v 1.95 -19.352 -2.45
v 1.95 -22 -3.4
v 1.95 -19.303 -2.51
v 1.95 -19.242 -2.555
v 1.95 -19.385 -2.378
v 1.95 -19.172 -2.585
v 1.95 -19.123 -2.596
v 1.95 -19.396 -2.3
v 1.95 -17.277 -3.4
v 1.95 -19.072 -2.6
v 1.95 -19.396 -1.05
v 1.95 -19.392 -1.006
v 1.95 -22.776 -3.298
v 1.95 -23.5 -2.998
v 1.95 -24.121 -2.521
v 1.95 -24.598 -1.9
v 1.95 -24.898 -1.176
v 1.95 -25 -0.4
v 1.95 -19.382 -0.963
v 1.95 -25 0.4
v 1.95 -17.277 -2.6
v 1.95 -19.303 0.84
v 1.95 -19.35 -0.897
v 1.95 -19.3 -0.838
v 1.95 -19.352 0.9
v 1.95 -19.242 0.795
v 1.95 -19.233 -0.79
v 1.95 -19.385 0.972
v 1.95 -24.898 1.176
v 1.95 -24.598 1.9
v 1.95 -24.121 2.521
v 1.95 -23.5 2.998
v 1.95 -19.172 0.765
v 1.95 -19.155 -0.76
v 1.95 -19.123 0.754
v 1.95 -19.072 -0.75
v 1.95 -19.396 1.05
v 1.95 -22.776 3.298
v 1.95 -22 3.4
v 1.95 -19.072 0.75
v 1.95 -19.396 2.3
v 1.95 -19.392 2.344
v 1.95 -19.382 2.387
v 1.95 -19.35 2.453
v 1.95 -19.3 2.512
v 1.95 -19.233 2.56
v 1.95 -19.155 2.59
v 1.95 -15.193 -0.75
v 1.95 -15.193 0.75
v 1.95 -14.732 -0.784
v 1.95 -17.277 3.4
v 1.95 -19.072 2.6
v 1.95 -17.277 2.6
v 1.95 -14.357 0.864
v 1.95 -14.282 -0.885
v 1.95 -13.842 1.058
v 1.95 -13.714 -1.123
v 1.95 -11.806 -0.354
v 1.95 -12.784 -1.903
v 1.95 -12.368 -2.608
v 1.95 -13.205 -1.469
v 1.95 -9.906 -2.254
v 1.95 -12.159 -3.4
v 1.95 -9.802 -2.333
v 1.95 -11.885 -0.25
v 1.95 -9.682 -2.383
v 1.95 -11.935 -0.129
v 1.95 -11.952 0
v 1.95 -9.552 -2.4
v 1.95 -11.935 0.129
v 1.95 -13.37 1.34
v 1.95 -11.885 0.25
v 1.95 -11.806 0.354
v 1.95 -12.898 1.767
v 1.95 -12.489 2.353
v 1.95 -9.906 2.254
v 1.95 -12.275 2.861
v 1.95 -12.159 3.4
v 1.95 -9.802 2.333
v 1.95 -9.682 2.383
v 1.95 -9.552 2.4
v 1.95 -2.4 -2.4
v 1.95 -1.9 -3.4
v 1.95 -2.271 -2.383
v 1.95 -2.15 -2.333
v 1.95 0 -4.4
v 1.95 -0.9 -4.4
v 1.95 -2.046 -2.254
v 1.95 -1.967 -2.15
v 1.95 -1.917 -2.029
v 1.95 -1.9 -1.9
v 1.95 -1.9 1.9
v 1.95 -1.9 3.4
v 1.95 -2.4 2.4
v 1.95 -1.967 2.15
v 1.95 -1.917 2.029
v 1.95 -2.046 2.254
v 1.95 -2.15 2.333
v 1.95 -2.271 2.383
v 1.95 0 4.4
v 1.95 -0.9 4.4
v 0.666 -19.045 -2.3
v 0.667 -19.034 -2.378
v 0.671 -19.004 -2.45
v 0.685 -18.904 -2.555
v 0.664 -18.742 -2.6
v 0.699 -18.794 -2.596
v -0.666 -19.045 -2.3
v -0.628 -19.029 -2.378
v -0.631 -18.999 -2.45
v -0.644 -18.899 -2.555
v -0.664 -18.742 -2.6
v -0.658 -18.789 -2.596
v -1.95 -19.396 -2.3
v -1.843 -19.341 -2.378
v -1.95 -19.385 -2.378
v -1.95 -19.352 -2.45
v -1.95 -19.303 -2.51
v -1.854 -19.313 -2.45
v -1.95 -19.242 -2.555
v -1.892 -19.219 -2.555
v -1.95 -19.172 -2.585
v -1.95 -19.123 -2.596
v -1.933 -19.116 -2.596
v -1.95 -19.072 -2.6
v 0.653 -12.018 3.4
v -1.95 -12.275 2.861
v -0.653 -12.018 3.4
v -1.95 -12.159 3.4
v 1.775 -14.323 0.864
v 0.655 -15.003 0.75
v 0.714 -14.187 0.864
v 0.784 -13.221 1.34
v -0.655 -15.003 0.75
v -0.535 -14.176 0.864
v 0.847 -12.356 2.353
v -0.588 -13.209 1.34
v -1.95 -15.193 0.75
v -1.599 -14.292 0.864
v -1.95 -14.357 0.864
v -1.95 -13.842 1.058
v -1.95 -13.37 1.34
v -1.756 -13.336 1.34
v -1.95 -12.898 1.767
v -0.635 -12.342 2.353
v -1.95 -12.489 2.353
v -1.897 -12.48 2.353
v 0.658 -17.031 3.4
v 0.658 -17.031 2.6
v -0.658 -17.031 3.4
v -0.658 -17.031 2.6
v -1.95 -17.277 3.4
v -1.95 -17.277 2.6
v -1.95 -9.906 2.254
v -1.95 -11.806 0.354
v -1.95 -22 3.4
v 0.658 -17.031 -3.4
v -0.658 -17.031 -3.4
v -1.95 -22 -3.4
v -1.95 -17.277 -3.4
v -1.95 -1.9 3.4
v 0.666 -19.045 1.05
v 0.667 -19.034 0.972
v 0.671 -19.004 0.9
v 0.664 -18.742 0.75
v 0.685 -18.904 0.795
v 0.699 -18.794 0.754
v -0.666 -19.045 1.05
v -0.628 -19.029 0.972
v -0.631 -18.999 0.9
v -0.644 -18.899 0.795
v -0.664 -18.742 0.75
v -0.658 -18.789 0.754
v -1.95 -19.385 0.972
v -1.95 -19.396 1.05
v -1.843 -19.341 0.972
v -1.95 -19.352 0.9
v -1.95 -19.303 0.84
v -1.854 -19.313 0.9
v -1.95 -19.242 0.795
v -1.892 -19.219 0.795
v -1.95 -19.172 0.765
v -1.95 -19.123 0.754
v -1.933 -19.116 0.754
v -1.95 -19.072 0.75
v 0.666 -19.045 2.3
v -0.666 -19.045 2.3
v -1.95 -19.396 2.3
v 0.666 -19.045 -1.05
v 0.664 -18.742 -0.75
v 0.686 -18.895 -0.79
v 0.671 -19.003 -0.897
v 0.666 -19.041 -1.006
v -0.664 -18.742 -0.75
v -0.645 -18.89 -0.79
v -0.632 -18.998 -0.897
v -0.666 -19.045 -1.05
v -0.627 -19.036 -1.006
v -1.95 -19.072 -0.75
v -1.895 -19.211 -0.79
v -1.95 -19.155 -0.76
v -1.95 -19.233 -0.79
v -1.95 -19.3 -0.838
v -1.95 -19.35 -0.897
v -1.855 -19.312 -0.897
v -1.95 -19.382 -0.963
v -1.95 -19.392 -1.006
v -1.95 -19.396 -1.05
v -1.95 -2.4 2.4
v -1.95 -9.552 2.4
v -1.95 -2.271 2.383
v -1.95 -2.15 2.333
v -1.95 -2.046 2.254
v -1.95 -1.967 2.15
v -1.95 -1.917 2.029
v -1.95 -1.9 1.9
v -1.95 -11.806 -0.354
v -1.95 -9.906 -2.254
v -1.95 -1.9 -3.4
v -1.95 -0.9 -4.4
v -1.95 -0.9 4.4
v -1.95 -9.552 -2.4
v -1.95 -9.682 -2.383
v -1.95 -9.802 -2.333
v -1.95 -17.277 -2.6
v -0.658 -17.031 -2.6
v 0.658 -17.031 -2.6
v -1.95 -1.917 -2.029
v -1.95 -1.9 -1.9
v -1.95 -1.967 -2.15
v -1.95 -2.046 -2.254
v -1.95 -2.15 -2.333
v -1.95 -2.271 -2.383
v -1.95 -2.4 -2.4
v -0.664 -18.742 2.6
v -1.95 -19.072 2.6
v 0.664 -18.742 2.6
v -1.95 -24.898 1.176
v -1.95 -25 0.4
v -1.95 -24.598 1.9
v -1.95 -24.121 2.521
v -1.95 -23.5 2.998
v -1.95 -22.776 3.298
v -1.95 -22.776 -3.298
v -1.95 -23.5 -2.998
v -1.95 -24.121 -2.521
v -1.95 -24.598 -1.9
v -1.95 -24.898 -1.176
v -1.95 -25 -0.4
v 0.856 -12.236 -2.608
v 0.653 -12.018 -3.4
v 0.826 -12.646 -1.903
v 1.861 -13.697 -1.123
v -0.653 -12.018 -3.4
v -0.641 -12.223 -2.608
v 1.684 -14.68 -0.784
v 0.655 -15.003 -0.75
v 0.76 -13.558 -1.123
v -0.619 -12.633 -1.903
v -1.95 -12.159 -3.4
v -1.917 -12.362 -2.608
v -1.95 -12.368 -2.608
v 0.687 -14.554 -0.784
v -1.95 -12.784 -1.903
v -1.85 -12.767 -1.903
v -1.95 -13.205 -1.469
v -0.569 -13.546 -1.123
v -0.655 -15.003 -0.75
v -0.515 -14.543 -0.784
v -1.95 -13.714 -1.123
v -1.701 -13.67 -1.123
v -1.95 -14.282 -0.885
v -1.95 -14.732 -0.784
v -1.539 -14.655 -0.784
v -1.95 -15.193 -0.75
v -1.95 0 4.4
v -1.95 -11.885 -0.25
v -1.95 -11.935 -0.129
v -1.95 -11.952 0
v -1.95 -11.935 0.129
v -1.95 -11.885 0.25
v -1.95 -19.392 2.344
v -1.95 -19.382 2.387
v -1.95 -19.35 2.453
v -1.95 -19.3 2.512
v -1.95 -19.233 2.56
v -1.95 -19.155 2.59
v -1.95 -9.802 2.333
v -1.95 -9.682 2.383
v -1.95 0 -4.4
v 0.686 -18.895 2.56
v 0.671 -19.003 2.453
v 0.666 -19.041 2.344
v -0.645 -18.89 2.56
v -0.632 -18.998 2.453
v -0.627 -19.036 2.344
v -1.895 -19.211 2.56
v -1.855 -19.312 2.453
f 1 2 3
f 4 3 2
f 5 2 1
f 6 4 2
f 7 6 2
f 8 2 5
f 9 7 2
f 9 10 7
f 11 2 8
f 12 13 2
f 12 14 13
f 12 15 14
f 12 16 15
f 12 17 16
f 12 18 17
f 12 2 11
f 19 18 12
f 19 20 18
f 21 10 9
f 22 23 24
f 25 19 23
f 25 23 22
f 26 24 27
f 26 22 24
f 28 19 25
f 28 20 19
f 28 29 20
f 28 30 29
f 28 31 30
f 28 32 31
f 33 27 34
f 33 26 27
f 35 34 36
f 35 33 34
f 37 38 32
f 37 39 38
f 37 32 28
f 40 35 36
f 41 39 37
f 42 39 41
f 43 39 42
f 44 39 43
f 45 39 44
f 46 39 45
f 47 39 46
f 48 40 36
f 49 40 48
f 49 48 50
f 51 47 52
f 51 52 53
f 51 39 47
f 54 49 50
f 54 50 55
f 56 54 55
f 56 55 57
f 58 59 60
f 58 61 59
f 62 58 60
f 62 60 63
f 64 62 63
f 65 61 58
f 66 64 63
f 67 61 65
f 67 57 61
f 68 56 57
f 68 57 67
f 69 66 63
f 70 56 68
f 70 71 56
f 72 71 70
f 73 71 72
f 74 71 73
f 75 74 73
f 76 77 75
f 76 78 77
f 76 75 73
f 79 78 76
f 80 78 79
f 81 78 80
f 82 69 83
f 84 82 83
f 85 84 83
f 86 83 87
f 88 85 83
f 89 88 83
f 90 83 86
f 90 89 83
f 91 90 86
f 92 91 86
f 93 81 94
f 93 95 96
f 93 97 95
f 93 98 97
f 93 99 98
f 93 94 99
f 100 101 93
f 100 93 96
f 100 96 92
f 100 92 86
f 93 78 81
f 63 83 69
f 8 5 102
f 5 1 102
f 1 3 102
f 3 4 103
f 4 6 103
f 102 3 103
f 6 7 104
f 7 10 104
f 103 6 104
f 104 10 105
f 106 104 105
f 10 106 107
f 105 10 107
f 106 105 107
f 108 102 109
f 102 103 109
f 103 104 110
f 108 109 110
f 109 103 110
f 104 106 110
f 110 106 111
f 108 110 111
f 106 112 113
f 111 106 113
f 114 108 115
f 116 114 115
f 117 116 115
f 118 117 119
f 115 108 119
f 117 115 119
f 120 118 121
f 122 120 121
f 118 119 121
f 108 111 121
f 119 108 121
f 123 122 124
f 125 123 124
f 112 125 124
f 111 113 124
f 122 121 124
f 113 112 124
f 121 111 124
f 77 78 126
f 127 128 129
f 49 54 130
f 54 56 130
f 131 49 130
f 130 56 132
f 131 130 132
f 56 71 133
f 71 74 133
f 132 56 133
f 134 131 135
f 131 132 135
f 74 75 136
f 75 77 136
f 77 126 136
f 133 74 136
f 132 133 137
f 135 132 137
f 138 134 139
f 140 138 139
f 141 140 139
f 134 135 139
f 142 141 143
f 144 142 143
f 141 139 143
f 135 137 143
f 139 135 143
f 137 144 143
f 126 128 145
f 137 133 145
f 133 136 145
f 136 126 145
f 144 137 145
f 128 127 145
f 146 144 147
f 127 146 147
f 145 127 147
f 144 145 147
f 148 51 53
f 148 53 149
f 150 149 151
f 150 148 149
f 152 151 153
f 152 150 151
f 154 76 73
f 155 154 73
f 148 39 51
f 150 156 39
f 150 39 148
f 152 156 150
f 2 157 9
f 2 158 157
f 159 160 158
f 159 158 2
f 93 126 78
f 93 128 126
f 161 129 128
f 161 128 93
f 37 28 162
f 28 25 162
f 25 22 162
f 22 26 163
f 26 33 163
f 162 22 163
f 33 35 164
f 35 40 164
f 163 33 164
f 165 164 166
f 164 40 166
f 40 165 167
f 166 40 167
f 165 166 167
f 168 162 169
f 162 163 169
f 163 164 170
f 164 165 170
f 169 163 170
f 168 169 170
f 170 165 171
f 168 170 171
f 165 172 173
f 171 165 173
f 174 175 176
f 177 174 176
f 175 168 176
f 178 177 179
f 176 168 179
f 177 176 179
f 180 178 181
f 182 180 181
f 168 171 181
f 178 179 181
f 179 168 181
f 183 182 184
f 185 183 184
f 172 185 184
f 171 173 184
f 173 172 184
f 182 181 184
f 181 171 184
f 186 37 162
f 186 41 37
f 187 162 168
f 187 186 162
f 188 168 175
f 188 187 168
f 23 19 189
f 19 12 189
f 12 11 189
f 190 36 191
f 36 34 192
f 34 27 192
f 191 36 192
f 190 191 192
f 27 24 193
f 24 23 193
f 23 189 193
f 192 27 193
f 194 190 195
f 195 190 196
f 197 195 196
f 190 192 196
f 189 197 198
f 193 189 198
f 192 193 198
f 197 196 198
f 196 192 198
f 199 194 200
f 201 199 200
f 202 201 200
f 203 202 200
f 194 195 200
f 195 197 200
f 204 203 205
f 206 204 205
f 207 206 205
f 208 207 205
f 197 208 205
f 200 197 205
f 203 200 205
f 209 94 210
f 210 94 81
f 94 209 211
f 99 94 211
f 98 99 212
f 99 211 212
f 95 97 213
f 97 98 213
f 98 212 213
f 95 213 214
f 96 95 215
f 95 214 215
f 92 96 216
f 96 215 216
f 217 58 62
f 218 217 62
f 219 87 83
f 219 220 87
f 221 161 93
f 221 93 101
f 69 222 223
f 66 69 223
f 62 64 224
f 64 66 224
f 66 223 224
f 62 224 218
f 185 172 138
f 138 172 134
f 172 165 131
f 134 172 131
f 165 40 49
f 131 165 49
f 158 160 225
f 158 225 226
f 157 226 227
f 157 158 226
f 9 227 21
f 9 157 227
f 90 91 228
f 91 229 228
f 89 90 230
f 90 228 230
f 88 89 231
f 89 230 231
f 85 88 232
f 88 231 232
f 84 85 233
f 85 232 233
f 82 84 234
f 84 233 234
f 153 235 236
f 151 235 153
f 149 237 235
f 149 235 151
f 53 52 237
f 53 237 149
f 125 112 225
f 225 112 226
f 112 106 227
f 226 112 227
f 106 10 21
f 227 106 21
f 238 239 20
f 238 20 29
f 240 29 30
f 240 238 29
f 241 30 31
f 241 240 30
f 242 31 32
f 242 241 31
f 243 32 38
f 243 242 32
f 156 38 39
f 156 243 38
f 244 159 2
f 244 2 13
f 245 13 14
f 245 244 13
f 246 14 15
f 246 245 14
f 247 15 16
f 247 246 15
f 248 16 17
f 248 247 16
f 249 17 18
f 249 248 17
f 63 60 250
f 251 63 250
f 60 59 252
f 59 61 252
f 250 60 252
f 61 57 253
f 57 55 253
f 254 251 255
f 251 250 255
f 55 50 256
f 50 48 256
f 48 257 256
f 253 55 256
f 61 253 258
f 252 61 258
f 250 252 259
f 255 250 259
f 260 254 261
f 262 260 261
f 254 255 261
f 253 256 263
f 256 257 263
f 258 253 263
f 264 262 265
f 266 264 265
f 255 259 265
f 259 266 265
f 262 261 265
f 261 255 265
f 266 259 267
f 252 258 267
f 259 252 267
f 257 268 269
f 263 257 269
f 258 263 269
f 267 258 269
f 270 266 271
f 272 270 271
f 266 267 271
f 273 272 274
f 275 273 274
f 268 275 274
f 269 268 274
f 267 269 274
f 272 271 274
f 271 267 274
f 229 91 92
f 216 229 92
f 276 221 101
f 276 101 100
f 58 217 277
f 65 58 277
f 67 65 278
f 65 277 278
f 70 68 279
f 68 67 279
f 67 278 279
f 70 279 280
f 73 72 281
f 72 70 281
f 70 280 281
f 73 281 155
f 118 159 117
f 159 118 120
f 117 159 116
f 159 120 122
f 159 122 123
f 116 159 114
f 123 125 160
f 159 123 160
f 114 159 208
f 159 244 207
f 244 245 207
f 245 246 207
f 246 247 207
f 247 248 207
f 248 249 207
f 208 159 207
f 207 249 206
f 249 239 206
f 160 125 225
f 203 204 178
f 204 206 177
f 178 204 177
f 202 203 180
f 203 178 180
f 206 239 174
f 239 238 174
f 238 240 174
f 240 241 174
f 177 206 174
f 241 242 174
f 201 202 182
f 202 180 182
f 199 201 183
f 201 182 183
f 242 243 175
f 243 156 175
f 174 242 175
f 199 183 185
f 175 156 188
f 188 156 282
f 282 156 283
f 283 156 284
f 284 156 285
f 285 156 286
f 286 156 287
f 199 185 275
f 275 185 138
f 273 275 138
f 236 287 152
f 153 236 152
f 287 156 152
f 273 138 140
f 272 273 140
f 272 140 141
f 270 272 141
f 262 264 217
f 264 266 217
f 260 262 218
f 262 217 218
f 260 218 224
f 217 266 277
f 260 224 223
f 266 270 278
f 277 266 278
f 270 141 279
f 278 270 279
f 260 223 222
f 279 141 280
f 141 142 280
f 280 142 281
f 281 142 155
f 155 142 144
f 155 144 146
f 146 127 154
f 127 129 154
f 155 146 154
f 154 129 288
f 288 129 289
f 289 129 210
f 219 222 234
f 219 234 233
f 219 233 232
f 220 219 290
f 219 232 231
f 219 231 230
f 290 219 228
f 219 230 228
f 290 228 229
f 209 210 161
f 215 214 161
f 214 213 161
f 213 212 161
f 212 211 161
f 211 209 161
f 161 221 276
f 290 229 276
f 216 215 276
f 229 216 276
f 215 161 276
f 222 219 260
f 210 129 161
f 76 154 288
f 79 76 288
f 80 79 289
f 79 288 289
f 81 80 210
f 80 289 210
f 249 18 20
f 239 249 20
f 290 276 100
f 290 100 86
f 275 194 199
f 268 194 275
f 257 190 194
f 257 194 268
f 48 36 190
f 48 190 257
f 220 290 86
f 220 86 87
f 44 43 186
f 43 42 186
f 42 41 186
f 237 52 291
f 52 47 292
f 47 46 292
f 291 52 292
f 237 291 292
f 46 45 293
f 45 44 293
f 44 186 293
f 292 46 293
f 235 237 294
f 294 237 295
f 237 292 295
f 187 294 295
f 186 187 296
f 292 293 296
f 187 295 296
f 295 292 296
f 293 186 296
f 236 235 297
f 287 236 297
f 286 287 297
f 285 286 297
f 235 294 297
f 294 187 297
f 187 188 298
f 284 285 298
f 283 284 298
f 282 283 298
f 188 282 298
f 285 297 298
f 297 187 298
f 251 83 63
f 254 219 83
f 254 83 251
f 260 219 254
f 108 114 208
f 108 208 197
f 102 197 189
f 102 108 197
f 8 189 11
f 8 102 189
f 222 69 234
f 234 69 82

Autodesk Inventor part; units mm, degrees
ref_plane "YZ Plane" through (0, 0, 0) normal (1, 0, 0) x (0, 1, 0)
ref_plane "XZ Plane" through (0, 0, 0) normal (0, 1, 0) x (-1, 0, 0)
ref_plane "XY Plane" through (0, 0, 0) normal (0, 0, 1) x (1, 0, 0)
sketch "Sketch1" plane through (0, 0, 0) normal (1, 0, 0) x (0, 1, 0)
  line L0 (0, 4.4) -> (0, -4.4)
  line L1 (0, -4.4) -> (-0.9, -4.4)
  line L2 (-0.9, -4.4) -> (-1.9, -3.4)
  line L3 (-1.9, -3.4) -> (-1.9, -3.4)
  line L4 (-1.9, -3.4) -> (-25, -3.4)
  line L5 (-25, -3.4) -> (-25, 3.4)
  line L6 (-25, 3.4) -> (-1.9, 3.4)
  line L7 (-1.9, 3.4) -> (-1.9, 3.4)
  line L8 (-1.9, 3.4) -> (-0.9, 4.4)
  line L9 (-0.9, 4.4) -> (0, 4.4)
  line L10 (0, 0) -> (-25, 0) construction
  line L11 (-24, 3.4) -> (-24, -3.4)
  line L12 (-12, 3.4) -> (-12, 0.75)
  line L13 (-12, 0.75) -> (-19, 0.75)
  line L14 (-19, 0.75) -> (-19, 2.6)
  line L15 (-19, 2.6) -> (-17, 2.6)
  line L16 (-17, 2.6) -> (-17, 3.4)
  line L17 (-12, -3.4) -> (-12, -0.75)
  line L18 (-12, -0.75) -> (-19, -0.75)
  line L19 (-19, -0.75) -> (-19, -2.6)
  line L20 (-19, -2.6) -> (-17, -2.6)
  line L21 (-17, -2.6) -> (-17, -3.4)
  dimension "d0" = 8.8
  dimension "d1" = 1.9
  dimension "d2" = 135
  dimension "d5" = 0.9
  dimension "d6" = 25
  dimension "d7" = 6.8
  dimension "d9" = 14
  dimension "d10" = 1
  dimension "d11" = 0.8
  dimension "d13" = 5
  dimension "d16" = 10
  dimension "d24" = 1.5
extrude "Extrusion1" add sketch "Sketch1" along normal mid plane 3.9
revolve "Revolution1" cut sketch "Sketch1" angle 360 about axis through (0, -24, 3.4) along (0, 0, -1) contours L12 L13 L14 L15 L16 L6 | L4 L21 L20 L19 L18 L17
fillet "Fillet1" radius 3 4 edges at (0, -12, 0.75) (0, -12, -0.75) (0, -25, -3.4) (0, -25, 3.4)
fillet "Fillet2" radius 0.3 4 edges at (0, -19, 2.6) (0, -19, 0.75) (0, -19, -0.75) (0, -19, -2.6)
sketch "Sketch2" plane through (1.95, 0, 0) normal (1, 0, 0) x (0, 0, -1)
  line L0 (-2.4, -1.9) -> (-2.4, -9.7595)
  line L1 (-2.4, -9.7595) -> (0, -12.1595)
  line L2 (0, -12.1595) -> (2.4, -9.7595)
  line L3 (2.4, -9.7595) -> (2.4, -1.9)
  line L4 (2.4, -1.9) -> (-2.4, -1.9)
  line L5 (-3.4, -1.9) -> (-3.4, -22) projected
  line L6 (0, 0) -> (0, -12.1595) construction
  line L7 (4.4, 0) -> (-4.4, 0) projected
  point P0 (-3.4, -12.1595)
  dimension "d19" = 1
  dimension "d20" = 135
extrude "Extrusion2" cut sketch "Sketch2" against normal through all
fillet "Fillet3" radius 0.5 5 edges at (0, -9.7595, 2.4) (0, -12.1595, 0) (0, -9.7595, -2.4) (0, -1.9, 2.4) (0, -1.9, -2.4)
properties part number "FS-04-SLBV1"
